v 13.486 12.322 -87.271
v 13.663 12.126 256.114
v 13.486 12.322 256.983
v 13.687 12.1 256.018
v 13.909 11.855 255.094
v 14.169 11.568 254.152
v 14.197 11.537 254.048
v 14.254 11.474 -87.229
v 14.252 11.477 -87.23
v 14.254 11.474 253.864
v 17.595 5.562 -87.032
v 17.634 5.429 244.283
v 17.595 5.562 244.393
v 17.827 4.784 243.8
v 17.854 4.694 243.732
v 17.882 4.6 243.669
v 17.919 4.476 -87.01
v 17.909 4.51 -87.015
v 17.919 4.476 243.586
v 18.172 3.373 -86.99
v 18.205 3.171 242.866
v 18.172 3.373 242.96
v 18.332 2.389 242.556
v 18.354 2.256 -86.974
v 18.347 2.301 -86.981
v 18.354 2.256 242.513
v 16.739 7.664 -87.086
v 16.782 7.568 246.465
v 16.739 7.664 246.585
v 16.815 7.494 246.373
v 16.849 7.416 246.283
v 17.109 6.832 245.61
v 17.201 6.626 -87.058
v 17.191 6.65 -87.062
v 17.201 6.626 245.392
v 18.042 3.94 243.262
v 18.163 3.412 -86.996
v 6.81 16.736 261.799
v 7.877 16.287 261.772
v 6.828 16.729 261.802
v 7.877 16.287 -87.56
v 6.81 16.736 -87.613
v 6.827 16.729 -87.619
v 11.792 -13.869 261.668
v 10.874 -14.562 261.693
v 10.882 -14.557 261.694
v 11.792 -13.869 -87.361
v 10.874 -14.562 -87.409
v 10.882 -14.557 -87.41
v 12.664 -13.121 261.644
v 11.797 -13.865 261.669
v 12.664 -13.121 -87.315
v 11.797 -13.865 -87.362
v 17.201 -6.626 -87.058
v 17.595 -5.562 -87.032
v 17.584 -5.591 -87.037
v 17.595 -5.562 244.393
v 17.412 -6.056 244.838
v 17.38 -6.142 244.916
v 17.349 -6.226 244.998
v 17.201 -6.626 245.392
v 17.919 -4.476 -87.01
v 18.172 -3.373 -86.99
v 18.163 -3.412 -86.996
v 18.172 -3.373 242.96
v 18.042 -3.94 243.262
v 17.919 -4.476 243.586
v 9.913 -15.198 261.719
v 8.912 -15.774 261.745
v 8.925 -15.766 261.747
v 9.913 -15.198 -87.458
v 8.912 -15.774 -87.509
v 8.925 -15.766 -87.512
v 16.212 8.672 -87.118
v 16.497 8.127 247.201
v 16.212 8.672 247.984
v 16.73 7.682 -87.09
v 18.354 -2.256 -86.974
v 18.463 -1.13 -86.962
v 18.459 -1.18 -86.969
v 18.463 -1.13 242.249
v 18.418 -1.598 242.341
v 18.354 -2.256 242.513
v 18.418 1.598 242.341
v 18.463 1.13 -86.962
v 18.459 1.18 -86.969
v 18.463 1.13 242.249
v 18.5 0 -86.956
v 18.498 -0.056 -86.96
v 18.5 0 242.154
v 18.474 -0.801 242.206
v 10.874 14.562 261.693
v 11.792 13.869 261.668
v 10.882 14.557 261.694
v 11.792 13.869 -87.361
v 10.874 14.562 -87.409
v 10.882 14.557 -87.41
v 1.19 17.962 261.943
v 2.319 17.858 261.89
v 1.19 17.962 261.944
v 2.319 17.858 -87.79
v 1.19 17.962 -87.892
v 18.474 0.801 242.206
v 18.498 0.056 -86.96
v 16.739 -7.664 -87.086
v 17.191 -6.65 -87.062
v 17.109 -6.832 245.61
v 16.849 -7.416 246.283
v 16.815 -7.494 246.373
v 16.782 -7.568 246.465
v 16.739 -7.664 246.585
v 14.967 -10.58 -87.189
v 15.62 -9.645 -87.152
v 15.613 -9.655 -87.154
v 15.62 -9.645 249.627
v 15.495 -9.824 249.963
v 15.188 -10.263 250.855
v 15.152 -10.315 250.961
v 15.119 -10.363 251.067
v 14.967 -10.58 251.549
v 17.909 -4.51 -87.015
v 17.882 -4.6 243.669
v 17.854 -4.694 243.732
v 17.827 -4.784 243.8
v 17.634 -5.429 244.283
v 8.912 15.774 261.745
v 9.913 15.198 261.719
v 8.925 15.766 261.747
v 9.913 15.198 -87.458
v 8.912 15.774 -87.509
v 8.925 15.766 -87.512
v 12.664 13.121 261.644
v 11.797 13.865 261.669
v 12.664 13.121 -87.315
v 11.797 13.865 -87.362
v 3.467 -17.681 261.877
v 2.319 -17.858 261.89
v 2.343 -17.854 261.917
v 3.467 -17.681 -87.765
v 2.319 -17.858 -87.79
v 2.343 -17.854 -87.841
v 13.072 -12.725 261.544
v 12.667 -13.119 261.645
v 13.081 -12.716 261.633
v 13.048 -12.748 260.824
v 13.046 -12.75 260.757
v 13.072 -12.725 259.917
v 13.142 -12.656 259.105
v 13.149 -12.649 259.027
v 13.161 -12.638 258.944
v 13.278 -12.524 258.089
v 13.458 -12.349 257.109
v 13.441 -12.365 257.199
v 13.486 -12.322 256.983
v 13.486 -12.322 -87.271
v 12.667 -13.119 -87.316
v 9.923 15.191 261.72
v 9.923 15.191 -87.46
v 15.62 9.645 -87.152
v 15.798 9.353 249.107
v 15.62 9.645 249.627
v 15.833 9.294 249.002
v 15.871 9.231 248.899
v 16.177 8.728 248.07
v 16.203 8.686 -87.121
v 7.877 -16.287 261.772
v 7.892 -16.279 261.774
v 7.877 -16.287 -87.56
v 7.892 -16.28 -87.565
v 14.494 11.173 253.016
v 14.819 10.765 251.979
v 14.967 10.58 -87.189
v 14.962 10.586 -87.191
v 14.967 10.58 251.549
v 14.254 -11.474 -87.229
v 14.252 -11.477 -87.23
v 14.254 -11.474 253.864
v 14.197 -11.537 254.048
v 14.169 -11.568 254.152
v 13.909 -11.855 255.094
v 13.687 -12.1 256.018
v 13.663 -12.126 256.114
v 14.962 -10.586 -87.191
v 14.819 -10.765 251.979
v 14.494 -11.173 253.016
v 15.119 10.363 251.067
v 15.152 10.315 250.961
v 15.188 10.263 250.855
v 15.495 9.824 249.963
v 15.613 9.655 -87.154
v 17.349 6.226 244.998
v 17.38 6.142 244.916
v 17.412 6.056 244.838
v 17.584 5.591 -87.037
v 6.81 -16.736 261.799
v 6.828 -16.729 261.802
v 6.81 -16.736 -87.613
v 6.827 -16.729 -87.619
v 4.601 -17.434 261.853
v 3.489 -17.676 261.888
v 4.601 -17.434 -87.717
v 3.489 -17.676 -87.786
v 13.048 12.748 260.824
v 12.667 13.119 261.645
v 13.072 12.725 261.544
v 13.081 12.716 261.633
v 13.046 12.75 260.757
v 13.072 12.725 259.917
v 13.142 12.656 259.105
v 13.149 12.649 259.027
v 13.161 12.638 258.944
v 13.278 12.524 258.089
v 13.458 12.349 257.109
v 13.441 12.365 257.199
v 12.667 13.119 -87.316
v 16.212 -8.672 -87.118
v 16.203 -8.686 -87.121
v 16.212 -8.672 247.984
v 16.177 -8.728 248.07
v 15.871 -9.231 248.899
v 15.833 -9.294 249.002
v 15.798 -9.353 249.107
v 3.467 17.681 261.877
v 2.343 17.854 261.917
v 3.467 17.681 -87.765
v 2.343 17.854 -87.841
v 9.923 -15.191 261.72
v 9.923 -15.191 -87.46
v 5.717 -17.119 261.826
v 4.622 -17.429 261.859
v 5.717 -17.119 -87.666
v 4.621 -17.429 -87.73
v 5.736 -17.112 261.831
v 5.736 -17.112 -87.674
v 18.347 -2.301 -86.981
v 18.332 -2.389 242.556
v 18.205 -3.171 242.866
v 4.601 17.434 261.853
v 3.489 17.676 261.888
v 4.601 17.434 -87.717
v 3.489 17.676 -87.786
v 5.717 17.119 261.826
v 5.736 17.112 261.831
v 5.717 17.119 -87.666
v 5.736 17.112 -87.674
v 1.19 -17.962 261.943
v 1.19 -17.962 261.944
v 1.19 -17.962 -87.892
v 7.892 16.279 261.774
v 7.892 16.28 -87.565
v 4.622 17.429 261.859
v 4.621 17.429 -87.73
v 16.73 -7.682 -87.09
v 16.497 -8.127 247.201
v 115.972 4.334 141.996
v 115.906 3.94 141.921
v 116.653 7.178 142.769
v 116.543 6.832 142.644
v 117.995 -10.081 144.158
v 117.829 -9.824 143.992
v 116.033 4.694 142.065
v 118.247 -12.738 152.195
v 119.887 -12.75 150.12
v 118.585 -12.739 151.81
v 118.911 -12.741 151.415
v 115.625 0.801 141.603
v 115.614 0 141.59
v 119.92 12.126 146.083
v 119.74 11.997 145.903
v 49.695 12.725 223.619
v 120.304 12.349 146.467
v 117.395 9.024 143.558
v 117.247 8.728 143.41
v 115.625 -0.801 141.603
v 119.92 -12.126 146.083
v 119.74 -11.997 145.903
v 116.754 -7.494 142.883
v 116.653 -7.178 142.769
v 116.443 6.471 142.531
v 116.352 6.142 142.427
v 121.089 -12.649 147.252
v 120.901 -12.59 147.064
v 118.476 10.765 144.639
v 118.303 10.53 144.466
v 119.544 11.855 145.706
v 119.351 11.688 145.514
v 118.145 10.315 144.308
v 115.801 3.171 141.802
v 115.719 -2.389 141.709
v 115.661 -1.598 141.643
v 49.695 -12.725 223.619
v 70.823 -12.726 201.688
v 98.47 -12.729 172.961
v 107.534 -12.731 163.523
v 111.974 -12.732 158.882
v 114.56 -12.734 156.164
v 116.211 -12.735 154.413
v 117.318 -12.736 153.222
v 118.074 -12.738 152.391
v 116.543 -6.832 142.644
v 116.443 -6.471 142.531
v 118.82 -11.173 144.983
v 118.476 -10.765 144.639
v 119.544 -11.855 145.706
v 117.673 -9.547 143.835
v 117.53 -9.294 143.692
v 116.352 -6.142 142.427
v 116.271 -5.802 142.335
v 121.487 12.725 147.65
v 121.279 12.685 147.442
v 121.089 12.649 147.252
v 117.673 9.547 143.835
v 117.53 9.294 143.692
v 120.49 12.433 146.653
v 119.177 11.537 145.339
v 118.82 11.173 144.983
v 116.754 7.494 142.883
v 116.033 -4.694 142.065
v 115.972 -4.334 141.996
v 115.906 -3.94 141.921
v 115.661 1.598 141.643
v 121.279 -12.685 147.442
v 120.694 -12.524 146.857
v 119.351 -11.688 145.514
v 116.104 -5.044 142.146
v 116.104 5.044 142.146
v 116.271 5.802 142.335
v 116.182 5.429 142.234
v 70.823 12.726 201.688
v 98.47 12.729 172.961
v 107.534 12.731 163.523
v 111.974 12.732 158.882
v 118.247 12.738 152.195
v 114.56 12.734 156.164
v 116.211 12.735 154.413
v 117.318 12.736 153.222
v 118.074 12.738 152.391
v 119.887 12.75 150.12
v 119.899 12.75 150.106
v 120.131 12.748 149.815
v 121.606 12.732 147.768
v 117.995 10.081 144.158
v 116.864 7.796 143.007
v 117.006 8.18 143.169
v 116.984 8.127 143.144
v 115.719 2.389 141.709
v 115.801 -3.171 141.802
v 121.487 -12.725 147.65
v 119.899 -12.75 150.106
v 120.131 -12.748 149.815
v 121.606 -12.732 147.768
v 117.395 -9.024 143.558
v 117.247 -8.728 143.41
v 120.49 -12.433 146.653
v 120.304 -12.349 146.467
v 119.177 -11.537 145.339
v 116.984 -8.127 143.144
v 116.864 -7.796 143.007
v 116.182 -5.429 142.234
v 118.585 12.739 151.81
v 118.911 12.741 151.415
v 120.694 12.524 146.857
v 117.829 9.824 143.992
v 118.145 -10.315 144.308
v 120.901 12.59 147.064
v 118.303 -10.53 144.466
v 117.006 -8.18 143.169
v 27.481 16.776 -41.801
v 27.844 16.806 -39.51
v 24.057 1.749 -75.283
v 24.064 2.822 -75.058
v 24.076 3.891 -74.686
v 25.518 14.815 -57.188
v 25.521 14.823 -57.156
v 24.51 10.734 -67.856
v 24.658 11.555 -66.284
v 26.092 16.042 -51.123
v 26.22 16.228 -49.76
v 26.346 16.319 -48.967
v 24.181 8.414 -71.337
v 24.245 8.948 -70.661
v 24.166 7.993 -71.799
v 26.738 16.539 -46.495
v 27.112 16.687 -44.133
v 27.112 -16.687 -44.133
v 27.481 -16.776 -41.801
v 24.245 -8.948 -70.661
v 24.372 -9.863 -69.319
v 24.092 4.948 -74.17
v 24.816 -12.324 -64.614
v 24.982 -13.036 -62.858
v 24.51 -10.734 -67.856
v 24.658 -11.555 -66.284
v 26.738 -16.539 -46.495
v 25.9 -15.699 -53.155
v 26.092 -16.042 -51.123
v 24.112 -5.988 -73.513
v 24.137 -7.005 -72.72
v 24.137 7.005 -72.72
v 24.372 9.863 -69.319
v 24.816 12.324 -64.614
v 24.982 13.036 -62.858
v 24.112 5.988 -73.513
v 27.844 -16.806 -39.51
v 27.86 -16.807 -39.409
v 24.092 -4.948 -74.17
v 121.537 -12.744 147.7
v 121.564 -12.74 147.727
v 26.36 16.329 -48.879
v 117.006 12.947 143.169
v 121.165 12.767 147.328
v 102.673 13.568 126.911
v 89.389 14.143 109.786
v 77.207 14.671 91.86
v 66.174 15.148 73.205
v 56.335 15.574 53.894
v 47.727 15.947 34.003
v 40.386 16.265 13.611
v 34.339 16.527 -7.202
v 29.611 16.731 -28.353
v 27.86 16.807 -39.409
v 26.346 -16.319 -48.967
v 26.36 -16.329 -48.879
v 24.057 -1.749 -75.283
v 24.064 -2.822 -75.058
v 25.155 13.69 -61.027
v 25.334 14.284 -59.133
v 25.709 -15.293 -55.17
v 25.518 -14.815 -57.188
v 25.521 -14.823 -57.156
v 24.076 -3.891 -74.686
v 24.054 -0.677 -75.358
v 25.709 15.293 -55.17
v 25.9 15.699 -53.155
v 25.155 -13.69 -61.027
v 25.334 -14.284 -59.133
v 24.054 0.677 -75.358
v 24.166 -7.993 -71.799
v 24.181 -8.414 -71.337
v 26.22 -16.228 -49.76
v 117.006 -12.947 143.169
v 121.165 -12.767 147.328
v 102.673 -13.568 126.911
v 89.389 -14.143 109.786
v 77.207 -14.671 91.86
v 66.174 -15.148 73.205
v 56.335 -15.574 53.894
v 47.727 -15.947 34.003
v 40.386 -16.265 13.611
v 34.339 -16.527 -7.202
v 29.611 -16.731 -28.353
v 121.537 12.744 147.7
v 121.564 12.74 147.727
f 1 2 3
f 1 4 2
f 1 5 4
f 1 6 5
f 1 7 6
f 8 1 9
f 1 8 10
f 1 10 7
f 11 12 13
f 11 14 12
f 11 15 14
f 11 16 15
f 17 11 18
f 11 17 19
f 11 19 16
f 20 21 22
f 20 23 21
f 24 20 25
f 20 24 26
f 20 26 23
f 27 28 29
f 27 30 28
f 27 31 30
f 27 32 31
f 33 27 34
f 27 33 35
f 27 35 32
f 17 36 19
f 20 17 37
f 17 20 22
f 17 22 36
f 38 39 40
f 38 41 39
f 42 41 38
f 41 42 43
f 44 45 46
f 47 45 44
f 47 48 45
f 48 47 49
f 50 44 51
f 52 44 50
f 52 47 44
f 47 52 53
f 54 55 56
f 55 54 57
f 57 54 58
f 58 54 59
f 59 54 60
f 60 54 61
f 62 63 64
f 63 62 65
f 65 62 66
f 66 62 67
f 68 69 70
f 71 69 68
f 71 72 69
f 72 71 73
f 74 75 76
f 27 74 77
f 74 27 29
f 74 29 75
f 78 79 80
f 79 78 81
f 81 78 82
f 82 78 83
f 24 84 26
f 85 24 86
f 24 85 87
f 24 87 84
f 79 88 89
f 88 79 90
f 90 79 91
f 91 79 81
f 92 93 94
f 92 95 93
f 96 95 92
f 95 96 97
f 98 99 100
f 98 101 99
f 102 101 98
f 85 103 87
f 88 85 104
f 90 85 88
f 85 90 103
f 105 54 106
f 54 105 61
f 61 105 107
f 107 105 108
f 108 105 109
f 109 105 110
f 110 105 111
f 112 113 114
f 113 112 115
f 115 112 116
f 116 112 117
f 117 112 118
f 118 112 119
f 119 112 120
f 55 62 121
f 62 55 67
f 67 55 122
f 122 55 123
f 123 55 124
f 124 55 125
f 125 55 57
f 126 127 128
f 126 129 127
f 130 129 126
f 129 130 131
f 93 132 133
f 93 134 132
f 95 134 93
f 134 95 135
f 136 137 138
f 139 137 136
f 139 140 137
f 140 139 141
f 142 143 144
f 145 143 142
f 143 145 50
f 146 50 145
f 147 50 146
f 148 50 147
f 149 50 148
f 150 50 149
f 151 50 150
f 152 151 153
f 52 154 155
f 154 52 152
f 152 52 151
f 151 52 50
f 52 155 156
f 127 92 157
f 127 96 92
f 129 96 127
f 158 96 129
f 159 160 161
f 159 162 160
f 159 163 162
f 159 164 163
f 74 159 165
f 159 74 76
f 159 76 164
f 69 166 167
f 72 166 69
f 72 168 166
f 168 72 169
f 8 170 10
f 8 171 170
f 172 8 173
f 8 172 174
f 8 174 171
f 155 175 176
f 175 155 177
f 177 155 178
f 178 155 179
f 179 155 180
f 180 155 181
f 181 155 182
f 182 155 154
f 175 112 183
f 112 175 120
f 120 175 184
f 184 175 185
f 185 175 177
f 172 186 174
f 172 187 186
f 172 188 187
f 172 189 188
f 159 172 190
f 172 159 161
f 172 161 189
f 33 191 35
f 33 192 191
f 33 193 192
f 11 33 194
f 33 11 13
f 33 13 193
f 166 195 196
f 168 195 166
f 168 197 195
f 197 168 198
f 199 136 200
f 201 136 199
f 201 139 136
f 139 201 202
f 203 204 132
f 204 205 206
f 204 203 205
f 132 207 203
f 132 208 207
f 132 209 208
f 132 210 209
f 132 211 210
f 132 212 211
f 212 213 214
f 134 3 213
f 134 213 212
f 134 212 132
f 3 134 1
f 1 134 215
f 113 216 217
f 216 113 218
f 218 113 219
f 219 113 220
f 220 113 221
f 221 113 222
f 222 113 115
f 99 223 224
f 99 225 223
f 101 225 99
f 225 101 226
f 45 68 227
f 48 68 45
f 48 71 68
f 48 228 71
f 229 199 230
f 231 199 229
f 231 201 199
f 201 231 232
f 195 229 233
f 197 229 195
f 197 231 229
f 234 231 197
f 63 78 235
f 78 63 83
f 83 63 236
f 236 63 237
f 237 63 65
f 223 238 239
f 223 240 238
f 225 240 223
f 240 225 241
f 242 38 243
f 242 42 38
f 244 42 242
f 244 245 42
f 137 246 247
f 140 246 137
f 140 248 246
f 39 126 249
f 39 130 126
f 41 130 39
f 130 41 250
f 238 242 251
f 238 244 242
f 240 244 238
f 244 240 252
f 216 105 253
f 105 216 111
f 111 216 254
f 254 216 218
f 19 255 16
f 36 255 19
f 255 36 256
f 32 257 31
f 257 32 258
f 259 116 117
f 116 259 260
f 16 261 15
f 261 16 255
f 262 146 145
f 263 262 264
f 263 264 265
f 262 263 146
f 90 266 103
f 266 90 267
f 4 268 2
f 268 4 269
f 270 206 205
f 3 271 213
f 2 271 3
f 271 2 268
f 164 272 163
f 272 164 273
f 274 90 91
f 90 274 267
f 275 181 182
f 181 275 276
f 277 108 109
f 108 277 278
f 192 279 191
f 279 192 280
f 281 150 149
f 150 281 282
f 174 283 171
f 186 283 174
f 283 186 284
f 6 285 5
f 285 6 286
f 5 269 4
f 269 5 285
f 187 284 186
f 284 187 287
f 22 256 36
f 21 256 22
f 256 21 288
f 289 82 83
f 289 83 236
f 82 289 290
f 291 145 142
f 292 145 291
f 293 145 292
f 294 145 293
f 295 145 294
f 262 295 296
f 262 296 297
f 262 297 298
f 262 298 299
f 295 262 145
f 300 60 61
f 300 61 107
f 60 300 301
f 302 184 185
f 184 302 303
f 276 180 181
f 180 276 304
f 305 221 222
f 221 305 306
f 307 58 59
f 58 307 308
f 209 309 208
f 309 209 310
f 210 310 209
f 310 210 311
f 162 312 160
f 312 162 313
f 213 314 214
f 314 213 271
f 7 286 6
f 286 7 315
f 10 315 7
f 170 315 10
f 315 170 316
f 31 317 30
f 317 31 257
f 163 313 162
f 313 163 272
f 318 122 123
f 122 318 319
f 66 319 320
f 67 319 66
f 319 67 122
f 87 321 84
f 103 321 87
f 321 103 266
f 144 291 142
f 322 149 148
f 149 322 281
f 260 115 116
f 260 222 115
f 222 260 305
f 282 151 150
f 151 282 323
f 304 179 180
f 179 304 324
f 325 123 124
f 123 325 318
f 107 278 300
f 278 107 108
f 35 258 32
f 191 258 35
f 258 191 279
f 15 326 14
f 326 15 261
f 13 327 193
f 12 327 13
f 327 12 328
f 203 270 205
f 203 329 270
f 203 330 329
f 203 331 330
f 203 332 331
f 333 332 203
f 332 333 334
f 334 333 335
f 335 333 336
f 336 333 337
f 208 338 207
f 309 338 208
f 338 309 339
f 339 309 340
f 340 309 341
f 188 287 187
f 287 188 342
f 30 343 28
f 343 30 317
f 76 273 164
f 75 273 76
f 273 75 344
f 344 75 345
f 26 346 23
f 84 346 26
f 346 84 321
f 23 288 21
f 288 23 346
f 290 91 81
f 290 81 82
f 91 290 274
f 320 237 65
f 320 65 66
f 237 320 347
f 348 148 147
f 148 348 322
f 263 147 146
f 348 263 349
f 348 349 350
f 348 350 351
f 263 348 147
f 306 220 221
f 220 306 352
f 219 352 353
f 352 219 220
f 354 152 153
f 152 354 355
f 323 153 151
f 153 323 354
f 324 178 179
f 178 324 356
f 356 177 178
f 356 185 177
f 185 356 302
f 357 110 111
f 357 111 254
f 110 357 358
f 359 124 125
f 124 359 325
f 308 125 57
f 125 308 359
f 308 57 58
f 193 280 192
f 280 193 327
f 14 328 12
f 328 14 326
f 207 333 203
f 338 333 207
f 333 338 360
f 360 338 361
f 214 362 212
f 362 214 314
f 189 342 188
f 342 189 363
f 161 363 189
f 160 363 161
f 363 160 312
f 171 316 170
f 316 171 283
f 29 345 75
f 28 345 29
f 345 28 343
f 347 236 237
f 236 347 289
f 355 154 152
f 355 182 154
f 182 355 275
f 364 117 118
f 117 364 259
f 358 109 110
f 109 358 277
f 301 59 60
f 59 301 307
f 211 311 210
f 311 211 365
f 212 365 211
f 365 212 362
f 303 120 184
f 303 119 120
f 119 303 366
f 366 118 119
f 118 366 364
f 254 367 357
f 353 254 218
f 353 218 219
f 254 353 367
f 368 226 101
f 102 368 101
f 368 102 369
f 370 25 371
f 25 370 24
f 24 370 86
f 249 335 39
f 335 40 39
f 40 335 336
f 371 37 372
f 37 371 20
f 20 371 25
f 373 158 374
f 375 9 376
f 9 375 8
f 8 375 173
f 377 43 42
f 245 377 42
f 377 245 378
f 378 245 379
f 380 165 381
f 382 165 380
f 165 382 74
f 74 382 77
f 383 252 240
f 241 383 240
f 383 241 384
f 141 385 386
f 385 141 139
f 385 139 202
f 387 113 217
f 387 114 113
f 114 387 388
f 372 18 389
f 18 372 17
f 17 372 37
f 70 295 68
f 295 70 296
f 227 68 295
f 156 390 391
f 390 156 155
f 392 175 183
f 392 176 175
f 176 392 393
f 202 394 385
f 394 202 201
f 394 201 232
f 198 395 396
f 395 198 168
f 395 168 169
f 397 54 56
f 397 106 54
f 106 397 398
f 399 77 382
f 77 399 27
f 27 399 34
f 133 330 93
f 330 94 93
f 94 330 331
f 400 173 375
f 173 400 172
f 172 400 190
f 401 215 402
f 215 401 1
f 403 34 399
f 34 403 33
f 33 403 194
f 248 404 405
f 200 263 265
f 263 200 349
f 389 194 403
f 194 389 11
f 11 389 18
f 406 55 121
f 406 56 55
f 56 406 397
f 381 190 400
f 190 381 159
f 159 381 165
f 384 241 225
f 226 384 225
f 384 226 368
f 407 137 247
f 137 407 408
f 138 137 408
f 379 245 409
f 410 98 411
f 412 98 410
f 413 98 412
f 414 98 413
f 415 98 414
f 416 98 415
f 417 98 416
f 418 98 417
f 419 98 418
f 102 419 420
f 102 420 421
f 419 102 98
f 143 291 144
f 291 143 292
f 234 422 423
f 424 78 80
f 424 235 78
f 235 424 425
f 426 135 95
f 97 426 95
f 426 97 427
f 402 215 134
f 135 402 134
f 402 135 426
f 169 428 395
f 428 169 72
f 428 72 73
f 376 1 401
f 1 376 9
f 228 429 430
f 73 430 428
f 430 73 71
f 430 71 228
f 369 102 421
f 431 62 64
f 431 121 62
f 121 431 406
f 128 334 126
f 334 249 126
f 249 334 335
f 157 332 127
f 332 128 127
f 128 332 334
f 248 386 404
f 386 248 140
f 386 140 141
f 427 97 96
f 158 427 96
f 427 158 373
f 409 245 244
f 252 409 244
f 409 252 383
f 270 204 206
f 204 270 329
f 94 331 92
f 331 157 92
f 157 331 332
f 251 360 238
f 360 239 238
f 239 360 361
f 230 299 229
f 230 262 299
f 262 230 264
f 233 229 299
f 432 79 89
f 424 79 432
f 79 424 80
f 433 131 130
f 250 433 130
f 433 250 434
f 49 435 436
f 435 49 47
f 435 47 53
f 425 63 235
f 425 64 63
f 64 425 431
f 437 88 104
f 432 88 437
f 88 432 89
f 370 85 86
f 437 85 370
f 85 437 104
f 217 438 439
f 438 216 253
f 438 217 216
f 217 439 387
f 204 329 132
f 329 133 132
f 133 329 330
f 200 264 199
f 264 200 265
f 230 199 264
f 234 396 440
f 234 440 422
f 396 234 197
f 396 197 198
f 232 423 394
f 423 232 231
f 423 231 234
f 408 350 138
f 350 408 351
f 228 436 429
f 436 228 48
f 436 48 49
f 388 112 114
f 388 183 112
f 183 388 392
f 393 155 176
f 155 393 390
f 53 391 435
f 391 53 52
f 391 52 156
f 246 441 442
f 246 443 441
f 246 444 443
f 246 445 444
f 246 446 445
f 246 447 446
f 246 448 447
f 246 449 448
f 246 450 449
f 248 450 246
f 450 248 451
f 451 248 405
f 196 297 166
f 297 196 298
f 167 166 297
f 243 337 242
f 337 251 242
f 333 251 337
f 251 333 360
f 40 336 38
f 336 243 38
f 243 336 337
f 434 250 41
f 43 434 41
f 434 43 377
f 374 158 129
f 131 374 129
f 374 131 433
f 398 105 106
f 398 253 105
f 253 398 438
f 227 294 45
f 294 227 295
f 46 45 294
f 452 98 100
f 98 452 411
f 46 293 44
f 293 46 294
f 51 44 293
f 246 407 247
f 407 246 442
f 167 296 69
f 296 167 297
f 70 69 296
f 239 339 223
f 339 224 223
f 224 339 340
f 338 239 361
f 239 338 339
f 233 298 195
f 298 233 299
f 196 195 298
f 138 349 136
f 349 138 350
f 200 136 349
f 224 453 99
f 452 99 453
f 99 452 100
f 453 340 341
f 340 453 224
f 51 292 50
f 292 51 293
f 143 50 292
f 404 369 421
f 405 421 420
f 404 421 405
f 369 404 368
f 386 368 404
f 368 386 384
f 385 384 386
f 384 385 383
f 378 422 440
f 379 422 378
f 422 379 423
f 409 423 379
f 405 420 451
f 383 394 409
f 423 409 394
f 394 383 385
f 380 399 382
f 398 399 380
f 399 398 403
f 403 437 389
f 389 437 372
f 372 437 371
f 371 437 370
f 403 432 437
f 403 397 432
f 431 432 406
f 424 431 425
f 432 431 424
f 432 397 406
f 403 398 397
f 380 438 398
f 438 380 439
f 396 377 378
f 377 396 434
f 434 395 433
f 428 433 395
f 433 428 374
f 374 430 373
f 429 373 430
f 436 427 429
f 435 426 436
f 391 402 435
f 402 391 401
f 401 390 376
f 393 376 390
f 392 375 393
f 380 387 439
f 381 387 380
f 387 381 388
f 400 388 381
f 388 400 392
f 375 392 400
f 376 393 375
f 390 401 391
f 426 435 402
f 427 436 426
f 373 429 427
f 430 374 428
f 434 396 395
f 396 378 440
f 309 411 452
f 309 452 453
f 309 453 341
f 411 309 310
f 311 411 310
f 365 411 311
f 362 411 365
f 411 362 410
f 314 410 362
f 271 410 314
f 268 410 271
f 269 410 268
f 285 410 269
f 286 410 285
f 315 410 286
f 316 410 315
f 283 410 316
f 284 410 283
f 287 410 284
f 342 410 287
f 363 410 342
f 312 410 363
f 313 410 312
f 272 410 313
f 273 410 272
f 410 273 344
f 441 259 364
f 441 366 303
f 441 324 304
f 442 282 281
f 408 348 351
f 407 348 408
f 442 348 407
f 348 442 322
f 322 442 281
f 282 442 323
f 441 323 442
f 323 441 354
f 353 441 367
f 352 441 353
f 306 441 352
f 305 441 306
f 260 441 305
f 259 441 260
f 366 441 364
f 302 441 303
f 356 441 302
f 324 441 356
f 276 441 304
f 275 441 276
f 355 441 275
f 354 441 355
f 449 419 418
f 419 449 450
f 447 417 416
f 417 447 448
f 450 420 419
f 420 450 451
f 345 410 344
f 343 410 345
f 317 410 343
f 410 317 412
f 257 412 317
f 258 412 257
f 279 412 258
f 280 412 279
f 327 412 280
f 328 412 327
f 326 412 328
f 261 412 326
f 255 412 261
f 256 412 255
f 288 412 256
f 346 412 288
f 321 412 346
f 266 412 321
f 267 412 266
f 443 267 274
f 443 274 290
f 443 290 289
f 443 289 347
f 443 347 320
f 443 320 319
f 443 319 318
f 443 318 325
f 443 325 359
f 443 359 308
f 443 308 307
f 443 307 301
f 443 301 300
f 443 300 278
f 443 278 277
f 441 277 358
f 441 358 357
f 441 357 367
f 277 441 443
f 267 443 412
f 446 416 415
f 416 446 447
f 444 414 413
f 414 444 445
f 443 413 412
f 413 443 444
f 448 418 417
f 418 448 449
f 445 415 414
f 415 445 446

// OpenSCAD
$fn=100;

module seattube()
{
	translate([0,0,-290]) scale([37/36,1,1]) cylinder(h=600, d=36);
}
module seatstay()
{
	hull()
	{
		translate([-3.7,0,0]) scale([18/25.5,1,1]) cylinder(h=400, d=25.5);
		translate([15.25,0,0]) cylinder(h=400, d=12);
	}
	/* translate([-8.2,0,5]) color("black") cube([9,25.5,10], center=true); */
	/* translate([18.25,0,5]) color("black") cube([6,12,10], center=true); */
	/* translate([4.25,0,3]) color("black") cube(6, center=true); */
	/* translate([4.25,0,17]) color([0,0,0,0.1]) cube(34, center=true); */
}
module frame()
{
	seattube();
	translate([270,0,0]) rotate([0,-44,0]) seatstay();
}
module wheel()
{
	translate([368.5,12.5,-93]) rotate([90,0,0]) cylinder(h=25, d=680);
}

//color("grey") frame();
//color("grey") wheel();
difference()
{
	hull()
	{
		translate([0,0,-88]) cylinder(h=350, d=36);
		difference()
		{
			translate([130,0,144]) rotate([0,-44,0]) translate([-3.7,0,0]) scale([18/25.5,1,1]) cylinder(h=150, d=25);
			translate([275,0,0]) rotate([0,-44,0]) translate([-3.7,0,0]) scale([18/25.5,1,1]) cylinder(h=375, d=26);
		}
	}
	frame();
	translate([368.5,50,-93]) rotate([90,0,0]) cylinder(h=100, d=690);
}

/*
hull()
{
	translate([0,-17,-80]) cylinder(h=350, d=1);
	translate([220,-11.75,45]) rotate([0,-44,0]) cylinder(h=300, d=1);
}
*/
